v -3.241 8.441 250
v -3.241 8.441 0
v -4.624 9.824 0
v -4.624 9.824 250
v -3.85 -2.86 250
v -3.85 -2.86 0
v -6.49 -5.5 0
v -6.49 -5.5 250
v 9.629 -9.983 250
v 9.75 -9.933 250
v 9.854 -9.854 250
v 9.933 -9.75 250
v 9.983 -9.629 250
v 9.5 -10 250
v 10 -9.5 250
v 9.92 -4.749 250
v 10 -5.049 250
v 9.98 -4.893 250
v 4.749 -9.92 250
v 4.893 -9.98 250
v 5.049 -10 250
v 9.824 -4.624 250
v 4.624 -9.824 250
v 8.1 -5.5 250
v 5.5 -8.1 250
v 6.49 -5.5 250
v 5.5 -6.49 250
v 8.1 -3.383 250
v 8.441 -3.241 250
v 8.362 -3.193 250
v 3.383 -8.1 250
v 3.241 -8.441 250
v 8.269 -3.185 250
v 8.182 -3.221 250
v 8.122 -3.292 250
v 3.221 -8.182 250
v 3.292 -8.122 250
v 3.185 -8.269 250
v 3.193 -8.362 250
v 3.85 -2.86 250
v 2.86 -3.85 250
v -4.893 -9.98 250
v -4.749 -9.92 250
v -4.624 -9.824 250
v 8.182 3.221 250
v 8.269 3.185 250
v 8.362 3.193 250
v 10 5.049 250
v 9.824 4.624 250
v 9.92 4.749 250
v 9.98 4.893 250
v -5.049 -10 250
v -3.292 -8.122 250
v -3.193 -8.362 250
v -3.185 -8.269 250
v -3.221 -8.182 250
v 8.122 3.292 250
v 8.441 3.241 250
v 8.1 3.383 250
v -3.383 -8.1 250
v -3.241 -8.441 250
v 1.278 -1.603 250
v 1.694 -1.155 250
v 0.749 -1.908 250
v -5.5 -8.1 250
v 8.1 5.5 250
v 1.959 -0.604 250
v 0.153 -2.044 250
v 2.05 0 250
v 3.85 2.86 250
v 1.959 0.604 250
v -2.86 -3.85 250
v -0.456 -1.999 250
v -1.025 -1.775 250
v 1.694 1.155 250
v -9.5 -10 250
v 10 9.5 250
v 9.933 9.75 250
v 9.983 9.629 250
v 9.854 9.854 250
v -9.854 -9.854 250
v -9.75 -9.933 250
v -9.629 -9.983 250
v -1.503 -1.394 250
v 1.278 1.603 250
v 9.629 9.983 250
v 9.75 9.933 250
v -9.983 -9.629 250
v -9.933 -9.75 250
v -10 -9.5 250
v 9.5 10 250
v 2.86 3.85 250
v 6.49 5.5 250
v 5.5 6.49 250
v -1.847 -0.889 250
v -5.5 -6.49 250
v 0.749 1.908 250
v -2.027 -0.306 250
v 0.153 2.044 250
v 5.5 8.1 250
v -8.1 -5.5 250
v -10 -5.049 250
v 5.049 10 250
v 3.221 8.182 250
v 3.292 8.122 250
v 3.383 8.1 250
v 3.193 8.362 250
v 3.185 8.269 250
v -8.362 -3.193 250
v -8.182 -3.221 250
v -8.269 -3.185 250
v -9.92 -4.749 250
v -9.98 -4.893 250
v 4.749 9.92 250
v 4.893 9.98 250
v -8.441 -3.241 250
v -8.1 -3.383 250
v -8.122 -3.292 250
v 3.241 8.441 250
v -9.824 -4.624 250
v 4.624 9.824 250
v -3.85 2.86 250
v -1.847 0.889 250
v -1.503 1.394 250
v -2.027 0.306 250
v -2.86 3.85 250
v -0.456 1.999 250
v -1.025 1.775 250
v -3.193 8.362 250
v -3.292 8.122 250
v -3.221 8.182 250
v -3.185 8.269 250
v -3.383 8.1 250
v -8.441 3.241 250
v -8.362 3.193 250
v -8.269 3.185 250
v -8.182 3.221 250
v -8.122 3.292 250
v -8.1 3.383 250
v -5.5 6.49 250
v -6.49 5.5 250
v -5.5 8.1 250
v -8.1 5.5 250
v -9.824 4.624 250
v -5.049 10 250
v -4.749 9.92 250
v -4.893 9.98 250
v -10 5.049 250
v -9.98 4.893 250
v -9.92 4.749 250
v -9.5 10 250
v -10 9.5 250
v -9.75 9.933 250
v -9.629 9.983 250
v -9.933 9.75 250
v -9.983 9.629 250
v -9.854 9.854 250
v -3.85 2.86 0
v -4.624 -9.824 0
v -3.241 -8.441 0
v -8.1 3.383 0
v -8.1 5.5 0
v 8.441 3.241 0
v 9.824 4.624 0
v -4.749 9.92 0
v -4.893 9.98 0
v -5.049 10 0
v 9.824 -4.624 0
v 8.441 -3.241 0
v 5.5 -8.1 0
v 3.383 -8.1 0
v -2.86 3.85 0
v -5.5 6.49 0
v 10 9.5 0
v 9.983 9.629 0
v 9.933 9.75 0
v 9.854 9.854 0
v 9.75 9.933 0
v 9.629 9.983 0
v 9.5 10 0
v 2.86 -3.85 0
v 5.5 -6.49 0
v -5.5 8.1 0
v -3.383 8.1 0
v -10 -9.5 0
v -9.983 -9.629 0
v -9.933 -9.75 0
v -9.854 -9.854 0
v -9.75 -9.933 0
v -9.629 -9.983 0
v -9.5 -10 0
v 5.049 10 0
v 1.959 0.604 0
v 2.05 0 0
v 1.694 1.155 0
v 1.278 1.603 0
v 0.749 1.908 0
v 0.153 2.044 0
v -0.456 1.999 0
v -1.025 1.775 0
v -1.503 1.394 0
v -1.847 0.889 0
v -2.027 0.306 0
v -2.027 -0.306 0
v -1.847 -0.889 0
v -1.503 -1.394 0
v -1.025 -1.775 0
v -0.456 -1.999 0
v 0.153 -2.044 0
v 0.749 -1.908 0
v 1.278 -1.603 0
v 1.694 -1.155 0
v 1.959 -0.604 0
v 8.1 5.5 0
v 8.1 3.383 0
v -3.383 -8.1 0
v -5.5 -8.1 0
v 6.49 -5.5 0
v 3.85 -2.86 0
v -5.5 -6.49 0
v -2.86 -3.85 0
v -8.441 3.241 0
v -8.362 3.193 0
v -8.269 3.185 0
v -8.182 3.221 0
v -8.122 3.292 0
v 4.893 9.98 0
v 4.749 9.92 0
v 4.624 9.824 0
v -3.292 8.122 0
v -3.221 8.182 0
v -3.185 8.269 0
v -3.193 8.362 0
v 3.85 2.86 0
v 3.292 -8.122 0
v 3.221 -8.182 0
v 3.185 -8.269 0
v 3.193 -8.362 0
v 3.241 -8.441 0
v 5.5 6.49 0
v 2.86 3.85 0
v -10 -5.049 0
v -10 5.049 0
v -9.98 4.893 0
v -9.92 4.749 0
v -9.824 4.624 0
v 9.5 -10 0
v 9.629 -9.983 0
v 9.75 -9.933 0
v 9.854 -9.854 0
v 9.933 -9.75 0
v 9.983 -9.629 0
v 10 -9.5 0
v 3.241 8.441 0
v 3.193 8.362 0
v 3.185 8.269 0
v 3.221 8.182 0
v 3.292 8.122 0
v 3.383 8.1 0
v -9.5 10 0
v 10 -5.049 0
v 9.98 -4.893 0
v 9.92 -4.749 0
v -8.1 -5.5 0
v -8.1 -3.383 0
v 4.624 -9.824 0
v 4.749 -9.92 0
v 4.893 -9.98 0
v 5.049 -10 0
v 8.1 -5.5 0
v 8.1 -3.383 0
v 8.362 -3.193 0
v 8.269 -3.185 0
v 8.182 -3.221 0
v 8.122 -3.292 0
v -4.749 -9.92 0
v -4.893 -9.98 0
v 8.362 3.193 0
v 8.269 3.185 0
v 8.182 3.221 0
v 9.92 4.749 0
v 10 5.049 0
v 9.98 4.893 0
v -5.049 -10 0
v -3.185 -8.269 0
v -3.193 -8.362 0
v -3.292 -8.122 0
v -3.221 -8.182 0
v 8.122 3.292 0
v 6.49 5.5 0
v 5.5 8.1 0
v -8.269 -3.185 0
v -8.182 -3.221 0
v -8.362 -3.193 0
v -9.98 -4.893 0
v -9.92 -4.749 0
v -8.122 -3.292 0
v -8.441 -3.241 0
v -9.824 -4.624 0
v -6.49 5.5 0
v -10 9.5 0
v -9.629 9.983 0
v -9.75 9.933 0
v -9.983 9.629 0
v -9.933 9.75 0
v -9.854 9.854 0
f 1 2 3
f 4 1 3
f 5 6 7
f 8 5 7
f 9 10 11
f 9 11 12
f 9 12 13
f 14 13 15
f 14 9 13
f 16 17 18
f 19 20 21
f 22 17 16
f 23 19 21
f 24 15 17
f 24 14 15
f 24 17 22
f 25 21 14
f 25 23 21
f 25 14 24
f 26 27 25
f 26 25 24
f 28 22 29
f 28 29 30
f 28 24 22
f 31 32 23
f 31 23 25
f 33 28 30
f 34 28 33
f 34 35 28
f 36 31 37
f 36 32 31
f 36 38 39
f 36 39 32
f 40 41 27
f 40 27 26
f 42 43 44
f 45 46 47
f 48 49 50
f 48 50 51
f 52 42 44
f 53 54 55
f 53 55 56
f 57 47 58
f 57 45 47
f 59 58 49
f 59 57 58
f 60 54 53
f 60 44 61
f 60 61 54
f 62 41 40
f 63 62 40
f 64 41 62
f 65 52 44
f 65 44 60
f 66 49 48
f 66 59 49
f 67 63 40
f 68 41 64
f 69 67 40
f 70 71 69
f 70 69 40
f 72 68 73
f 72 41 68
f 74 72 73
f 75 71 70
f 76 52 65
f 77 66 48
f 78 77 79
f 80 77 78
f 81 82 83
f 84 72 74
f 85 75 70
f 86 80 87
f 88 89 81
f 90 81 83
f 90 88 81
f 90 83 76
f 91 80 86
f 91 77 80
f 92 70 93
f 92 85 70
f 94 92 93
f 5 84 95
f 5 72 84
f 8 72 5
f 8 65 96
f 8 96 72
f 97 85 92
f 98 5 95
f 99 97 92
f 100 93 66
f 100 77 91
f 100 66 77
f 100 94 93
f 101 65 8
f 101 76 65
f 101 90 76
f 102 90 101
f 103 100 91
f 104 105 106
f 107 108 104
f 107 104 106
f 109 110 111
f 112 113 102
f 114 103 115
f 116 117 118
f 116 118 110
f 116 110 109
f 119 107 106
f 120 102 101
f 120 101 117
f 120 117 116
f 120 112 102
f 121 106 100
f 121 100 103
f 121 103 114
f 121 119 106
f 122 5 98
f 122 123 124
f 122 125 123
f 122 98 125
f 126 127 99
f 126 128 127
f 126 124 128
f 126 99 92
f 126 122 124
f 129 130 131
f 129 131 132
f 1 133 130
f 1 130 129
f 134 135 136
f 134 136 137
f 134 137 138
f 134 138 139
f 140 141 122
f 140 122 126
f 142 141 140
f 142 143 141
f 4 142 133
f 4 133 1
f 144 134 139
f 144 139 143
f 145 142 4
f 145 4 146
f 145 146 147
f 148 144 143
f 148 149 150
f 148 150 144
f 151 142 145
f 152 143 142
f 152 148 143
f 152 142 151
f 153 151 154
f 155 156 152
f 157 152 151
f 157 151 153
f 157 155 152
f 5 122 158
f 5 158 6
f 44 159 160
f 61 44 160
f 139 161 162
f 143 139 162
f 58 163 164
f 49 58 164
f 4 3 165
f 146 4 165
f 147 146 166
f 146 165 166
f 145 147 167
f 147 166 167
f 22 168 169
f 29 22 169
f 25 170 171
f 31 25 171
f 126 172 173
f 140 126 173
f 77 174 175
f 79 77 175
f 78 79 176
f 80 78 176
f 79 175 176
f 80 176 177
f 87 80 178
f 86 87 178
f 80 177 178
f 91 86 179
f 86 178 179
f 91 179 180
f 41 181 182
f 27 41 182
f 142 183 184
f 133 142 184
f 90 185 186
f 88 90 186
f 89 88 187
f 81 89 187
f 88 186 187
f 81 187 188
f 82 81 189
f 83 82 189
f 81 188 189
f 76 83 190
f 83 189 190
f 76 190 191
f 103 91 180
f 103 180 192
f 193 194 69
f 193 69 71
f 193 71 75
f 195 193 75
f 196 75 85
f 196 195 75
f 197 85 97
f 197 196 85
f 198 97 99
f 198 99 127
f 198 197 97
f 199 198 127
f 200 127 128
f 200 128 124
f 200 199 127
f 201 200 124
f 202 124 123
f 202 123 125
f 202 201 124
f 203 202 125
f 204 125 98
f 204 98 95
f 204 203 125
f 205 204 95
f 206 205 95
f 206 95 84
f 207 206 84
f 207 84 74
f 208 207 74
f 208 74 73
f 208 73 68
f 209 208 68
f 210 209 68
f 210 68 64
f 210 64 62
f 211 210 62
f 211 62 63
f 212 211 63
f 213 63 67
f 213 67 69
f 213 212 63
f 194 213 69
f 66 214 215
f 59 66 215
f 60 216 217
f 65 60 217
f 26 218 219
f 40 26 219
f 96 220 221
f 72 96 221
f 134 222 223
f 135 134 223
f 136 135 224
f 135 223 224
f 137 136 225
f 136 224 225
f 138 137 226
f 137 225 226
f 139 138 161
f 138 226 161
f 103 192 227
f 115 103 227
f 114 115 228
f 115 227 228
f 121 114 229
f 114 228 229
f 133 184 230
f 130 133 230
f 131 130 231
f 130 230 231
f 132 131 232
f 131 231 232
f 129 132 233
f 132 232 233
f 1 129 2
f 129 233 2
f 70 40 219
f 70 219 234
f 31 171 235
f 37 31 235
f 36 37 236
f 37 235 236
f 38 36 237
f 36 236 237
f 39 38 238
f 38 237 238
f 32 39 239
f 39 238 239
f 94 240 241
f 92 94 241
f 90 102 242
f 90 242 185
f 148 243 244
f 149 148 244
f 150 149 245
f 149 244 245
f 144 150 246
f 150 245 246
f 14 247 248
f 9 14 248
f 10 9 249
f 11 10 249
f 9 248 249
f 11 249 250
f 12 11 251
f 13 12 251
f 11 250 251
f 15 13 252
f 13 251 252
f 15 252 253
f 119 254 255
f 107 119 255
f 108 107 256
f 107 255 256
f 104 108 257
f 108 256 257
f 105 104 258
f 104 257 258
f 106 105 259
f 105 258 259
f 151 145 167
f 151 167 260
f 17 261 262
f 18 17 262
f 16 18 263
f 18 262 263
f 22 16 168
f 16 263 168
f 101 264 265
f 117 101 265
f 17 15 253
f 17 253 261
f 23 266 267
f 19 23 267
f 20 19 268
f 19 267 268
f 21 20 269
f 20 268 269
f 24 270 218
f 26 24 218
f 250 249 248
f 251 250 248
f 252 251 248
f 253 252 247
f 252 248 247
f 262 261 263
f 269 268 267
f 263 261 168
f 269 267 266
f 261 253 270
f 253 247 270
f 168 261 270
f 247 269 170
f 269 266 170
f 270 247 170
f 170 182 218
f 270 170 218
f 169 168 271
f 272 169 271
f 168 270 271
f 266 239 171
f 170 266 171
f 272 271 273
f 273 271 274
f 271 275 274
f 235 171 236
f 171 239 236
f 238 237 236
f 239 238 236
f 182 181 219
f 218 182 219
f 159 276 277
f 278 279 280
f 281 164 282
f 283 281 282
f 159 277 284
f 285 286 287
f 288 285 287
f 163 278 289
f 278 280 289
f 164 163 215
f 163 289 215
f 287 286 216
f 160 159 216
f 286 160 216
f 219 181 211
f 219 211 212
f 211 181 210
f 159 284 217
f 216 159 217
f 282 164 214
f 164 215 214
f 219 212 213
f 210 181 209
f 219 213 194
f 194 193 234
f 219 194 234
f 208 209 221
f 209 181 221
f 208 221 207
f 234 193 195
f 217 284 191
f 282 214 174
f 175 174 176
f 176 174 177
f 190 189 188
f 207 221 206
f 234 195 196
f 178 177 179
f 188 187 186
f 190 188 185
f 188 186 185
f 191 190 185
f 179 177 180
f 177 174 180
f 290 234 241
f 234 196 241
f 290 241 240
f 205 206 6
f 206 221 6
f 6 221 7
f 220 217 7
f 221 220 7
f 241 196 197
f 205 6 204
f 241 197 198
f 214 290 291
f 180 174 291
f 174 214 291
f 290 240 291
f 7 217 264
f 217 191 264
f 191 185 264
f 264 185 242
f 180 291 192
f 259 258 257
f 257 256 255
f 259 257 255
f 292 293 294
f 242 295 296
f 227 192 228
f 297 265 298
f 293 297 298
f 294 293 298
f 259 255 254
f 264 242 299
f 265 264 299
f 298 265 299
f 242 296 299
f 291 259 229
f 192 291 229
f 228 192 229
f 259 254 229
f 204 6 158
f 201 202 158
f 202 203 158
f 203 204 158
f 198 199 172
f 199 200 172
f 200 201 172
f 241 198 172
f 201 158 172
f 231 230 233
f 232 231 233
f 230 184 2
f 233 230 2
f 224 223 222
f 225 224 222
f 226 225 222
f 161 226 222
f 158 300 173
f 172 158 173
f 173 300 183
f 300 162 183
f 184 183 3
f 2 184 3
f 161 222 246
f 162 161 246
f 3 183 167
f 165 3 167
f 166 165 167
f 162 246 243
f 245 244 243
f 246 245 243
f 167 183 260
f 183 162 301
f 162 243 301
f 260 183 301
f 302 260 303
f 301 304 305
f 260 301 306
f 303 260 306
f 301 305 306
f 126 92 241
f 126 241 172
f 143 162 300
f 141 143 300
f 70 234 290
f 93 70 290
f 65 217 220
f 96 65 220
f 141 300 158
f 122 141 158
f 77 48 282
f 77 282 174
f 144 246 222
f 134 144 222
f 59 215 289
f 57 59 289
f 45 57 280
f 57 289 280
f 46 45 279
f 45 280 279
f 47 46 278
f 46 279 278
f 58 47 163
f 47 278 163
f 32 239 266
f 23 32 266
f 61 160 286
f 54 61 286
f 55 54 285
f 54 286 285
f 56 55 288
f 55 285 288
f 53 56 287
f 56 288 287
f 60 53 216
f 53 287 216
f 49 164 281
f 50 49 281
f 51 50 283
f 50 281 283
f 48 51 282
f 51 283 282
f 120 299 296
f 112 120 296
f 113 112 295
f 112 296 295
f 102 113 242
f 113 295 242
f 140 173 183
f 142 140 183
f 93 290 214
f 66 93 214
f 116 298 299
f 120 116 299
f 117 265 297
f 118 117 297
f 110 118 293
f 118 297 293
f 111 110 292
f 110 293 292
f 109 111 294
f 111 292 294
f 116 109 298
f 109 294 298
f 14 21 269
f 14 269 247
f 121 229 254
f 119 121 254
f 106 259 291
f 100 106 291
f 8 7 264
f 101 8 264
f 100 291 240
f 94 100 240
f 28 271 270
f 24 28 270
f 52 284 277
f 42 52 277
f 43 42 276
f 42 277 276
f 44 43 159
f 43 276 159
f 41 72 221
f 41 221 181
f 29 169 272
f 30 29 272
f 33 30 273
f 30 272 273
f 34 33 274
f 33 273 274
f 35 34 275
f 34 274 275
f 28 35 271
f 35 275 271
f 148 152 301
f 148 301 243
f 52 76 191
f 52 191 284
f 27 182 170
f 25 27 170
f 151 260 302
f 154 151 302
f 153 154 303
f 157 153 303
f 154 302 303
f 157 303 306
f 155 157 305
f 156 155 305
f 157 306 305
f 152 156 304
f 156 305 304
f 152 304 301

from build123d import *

# Parameters (mm, degrees)
SKETCH1_R           = 2.05
BOSS_EXTRUDE1_DEPTH = 250


with BuildPart() as part:
    # Sketch1 → Boss-Extrude1 (new body)
    with BuildSketch(Plane(origin=(0, 0, 0), x_dir=(0, 1, 0), z_dir=(0, 0, 1))):
        with BuildLine():
            Line((-2.860050506, -3.85), (2.860050506, -3.85))
            Line((2.860050506, -3.85), (5.5, -6.489949494))
            Line((5.5, -6.489949494), (5.5, -8.1))
            Line((5.5, -8.1), (3.382842712, -8.1))
            ThreePointArc((3.382842712, -8.1), (3.198066806, -8.223463314), (3.241421356, -8.441421356))
            Line((3.241421356, -8.441421356), (4.624264069, -9.824264069))
            ThreePointArc((4.624264069, -9.824264069), (4.818918078, -9.95432772), (5.048528137, -10))
            Line((5.048528137, -10), (9.5, -10))
            ThreePointArc((9.5, -10), (9.853553391, -9.853553391), (10, -9.5))
            Line((10, -9.5), (10, -5.048528137))
            ThreePointArc((10, -5.048528137), (9.95432772, -4.818918078), (9.824264069, -4.624264069))
            Line((9.824264069, -4.624264069), (8.441421356, -3.241421356))
            ThreePointArc((8.441421356, -3.241421356), (8.223463314, -3.198066806), (8.1, -3.382842712))
            Line((8.1, -3.382842712), (8.1, -5.5))
            Line((8.1, -5.5), (6.489949494, -5.5))
            Line((6.489949494, -5.5), (3.85, -2.860050506))
            Line((3.85, -2.860050506), (3.85, 2.860050506))
            Line((3.85, 2.860050506), (6.489949494, 5.5))
            Line((6.489949494, 5.5), (8.1, 5.5))
            Line((8.1, 5.5), (8.1, 3.382842712))
            ThreePointArc((8.1, 3.382842712), (8.223463314, 3.198066806), (8.441421356, 3.241421356))
            Line((8.441421356, 3.241421356), (9.824264069, 4.624264069))
            ThreePointArc((9.824264069, 4.624264069), (9.95432772, 4.818918078), (10, 5.048528137))
            Line((10, 5.048528137), (10, 9.5))
            ThreePointArc((10, 9.5), (9.853553391, 9.853553391), (9.5, 10))
            Line((9.5, 10), (5.048528137, 10))
            ThreePointArc((5.048528137, 10), (4.818918078, 9.95432772), (4.624264069, 9.824264069))
            Line((4.624264069, 9.824264069), (3.241421356, 8.441421356))
            ThreePointArc((3.241421356, 8.441421356), (3.198066806, 8.223463314), (3.382842712, 8.1))
            Line((3.382842712, 8.1), (5.5, 8.1))
            Line((5.5, 8.1), (5.5, 6.489949494))
            Line((5.5, 6.489949494), (2.860050506, 3.85))
            Line((2.860050506, 3.85), (-2.860050506, 3.85))
            Line((-2.860050506, 3.85), (-5.5, 6.489949494))
            Line((-5.5, 6.489949494), (-5.5, 8.1))
            Line((-5.5, 8.1), (-3.382842712, 8.1))
            ThreePointArc((-3.382842712, 8.1), (-3.198066806, 8.223463314), (-3.241421356, 8.441421356))
            Line((-3.241421356, 8.441421356), (-4.624264069, 9.824264069))
            ThreePointArc((-4.624264069, 9.824264069), (-4.818918078, 9.95432772), (-5.048528137, 10))
            Line((-5.048528137, 10), (-9.5, 10))
            ThreePointArc((-9.5, 10), (-9.853553391, 9.853553391), (-10, 9.5))
            Line((-10, 9.5), (-10, 5.048528137))
            ThreePointArc((-10, 5.048528137), (-9.95432772, 4.818918078), (-9.824264069, 4.624264069))
            Line((-9.824264069, 4.624264069), (-8.441421356, 3.241421356))
            ThreePointArc((-8.441421356, 3.241421356), (-8.223463314, 3.198066806), (-8.1, 3.382842712))
            Line((-8.1, 3.382842712), (-8.1, 5.5))
            Line((-8.1, 5.5), (-6.489949494, 5.5))
            Line((-6.489949494, 5.5), (-3.85, 2.860050506))
            Line((-3.85, 2.860050506), (-3.85, -2.860050506))
            Line((-3.85, -2.860050506), (-6.489949494, -5.5))
            Line((-6.489949494, -5.5), (-8.1, -5.5))
            Line((-8.1, -5.5), (-8.1, -3.382842712))
            ThreePointArc((-8.1, -3.382842712), (-8.223463314, -3.198066806), (-8.441421356, -3.241421356))
            Line((-8.441421356, -3.241421356), (-9.824264069, -4.624264069))
            ThreePointArc((-9.824264069, -4.624264069), (-9.95432772, -4.818918078), (-10, -5.048528137))
            Line((-10, -5.048528137), (-10, -9.5))
            ThreePointArc((-10, -9.5), (-9.853553391, -9.853553391), (-9.5, -10))
            Line((-9.5, -10), (-5.048528137, -10))
            ThreePointArc((-5.048528137, -10), (-4.818918078, -9.95432772), (-4.624264069, -9.824264069))
            Line((-4.624264069, -9.824264069), (-3.241421356, -8.441421356))
            ThreePointArc((-3.241421356, -8.441421356), (-3.198066806, -8.223463314), (-3.382842712, -8.1))
            Line((-3.382842712, -8.1), (-5.5, -8.1))
            Line((-5.5, -8.1), (-5.5, -6.489949494))
            Line((-5.5, -6.489949494), (-2.860050506, -3.85))
        make_face()
        with Locations(Location((0, 0, 0), (0, 0, 270))):
            Circle(SKETCH1_R, mode=Mode.SUBTRACT)
    extrude(amount=BOSS_EXTRUDE1_DEPTH)


solid = part.part
